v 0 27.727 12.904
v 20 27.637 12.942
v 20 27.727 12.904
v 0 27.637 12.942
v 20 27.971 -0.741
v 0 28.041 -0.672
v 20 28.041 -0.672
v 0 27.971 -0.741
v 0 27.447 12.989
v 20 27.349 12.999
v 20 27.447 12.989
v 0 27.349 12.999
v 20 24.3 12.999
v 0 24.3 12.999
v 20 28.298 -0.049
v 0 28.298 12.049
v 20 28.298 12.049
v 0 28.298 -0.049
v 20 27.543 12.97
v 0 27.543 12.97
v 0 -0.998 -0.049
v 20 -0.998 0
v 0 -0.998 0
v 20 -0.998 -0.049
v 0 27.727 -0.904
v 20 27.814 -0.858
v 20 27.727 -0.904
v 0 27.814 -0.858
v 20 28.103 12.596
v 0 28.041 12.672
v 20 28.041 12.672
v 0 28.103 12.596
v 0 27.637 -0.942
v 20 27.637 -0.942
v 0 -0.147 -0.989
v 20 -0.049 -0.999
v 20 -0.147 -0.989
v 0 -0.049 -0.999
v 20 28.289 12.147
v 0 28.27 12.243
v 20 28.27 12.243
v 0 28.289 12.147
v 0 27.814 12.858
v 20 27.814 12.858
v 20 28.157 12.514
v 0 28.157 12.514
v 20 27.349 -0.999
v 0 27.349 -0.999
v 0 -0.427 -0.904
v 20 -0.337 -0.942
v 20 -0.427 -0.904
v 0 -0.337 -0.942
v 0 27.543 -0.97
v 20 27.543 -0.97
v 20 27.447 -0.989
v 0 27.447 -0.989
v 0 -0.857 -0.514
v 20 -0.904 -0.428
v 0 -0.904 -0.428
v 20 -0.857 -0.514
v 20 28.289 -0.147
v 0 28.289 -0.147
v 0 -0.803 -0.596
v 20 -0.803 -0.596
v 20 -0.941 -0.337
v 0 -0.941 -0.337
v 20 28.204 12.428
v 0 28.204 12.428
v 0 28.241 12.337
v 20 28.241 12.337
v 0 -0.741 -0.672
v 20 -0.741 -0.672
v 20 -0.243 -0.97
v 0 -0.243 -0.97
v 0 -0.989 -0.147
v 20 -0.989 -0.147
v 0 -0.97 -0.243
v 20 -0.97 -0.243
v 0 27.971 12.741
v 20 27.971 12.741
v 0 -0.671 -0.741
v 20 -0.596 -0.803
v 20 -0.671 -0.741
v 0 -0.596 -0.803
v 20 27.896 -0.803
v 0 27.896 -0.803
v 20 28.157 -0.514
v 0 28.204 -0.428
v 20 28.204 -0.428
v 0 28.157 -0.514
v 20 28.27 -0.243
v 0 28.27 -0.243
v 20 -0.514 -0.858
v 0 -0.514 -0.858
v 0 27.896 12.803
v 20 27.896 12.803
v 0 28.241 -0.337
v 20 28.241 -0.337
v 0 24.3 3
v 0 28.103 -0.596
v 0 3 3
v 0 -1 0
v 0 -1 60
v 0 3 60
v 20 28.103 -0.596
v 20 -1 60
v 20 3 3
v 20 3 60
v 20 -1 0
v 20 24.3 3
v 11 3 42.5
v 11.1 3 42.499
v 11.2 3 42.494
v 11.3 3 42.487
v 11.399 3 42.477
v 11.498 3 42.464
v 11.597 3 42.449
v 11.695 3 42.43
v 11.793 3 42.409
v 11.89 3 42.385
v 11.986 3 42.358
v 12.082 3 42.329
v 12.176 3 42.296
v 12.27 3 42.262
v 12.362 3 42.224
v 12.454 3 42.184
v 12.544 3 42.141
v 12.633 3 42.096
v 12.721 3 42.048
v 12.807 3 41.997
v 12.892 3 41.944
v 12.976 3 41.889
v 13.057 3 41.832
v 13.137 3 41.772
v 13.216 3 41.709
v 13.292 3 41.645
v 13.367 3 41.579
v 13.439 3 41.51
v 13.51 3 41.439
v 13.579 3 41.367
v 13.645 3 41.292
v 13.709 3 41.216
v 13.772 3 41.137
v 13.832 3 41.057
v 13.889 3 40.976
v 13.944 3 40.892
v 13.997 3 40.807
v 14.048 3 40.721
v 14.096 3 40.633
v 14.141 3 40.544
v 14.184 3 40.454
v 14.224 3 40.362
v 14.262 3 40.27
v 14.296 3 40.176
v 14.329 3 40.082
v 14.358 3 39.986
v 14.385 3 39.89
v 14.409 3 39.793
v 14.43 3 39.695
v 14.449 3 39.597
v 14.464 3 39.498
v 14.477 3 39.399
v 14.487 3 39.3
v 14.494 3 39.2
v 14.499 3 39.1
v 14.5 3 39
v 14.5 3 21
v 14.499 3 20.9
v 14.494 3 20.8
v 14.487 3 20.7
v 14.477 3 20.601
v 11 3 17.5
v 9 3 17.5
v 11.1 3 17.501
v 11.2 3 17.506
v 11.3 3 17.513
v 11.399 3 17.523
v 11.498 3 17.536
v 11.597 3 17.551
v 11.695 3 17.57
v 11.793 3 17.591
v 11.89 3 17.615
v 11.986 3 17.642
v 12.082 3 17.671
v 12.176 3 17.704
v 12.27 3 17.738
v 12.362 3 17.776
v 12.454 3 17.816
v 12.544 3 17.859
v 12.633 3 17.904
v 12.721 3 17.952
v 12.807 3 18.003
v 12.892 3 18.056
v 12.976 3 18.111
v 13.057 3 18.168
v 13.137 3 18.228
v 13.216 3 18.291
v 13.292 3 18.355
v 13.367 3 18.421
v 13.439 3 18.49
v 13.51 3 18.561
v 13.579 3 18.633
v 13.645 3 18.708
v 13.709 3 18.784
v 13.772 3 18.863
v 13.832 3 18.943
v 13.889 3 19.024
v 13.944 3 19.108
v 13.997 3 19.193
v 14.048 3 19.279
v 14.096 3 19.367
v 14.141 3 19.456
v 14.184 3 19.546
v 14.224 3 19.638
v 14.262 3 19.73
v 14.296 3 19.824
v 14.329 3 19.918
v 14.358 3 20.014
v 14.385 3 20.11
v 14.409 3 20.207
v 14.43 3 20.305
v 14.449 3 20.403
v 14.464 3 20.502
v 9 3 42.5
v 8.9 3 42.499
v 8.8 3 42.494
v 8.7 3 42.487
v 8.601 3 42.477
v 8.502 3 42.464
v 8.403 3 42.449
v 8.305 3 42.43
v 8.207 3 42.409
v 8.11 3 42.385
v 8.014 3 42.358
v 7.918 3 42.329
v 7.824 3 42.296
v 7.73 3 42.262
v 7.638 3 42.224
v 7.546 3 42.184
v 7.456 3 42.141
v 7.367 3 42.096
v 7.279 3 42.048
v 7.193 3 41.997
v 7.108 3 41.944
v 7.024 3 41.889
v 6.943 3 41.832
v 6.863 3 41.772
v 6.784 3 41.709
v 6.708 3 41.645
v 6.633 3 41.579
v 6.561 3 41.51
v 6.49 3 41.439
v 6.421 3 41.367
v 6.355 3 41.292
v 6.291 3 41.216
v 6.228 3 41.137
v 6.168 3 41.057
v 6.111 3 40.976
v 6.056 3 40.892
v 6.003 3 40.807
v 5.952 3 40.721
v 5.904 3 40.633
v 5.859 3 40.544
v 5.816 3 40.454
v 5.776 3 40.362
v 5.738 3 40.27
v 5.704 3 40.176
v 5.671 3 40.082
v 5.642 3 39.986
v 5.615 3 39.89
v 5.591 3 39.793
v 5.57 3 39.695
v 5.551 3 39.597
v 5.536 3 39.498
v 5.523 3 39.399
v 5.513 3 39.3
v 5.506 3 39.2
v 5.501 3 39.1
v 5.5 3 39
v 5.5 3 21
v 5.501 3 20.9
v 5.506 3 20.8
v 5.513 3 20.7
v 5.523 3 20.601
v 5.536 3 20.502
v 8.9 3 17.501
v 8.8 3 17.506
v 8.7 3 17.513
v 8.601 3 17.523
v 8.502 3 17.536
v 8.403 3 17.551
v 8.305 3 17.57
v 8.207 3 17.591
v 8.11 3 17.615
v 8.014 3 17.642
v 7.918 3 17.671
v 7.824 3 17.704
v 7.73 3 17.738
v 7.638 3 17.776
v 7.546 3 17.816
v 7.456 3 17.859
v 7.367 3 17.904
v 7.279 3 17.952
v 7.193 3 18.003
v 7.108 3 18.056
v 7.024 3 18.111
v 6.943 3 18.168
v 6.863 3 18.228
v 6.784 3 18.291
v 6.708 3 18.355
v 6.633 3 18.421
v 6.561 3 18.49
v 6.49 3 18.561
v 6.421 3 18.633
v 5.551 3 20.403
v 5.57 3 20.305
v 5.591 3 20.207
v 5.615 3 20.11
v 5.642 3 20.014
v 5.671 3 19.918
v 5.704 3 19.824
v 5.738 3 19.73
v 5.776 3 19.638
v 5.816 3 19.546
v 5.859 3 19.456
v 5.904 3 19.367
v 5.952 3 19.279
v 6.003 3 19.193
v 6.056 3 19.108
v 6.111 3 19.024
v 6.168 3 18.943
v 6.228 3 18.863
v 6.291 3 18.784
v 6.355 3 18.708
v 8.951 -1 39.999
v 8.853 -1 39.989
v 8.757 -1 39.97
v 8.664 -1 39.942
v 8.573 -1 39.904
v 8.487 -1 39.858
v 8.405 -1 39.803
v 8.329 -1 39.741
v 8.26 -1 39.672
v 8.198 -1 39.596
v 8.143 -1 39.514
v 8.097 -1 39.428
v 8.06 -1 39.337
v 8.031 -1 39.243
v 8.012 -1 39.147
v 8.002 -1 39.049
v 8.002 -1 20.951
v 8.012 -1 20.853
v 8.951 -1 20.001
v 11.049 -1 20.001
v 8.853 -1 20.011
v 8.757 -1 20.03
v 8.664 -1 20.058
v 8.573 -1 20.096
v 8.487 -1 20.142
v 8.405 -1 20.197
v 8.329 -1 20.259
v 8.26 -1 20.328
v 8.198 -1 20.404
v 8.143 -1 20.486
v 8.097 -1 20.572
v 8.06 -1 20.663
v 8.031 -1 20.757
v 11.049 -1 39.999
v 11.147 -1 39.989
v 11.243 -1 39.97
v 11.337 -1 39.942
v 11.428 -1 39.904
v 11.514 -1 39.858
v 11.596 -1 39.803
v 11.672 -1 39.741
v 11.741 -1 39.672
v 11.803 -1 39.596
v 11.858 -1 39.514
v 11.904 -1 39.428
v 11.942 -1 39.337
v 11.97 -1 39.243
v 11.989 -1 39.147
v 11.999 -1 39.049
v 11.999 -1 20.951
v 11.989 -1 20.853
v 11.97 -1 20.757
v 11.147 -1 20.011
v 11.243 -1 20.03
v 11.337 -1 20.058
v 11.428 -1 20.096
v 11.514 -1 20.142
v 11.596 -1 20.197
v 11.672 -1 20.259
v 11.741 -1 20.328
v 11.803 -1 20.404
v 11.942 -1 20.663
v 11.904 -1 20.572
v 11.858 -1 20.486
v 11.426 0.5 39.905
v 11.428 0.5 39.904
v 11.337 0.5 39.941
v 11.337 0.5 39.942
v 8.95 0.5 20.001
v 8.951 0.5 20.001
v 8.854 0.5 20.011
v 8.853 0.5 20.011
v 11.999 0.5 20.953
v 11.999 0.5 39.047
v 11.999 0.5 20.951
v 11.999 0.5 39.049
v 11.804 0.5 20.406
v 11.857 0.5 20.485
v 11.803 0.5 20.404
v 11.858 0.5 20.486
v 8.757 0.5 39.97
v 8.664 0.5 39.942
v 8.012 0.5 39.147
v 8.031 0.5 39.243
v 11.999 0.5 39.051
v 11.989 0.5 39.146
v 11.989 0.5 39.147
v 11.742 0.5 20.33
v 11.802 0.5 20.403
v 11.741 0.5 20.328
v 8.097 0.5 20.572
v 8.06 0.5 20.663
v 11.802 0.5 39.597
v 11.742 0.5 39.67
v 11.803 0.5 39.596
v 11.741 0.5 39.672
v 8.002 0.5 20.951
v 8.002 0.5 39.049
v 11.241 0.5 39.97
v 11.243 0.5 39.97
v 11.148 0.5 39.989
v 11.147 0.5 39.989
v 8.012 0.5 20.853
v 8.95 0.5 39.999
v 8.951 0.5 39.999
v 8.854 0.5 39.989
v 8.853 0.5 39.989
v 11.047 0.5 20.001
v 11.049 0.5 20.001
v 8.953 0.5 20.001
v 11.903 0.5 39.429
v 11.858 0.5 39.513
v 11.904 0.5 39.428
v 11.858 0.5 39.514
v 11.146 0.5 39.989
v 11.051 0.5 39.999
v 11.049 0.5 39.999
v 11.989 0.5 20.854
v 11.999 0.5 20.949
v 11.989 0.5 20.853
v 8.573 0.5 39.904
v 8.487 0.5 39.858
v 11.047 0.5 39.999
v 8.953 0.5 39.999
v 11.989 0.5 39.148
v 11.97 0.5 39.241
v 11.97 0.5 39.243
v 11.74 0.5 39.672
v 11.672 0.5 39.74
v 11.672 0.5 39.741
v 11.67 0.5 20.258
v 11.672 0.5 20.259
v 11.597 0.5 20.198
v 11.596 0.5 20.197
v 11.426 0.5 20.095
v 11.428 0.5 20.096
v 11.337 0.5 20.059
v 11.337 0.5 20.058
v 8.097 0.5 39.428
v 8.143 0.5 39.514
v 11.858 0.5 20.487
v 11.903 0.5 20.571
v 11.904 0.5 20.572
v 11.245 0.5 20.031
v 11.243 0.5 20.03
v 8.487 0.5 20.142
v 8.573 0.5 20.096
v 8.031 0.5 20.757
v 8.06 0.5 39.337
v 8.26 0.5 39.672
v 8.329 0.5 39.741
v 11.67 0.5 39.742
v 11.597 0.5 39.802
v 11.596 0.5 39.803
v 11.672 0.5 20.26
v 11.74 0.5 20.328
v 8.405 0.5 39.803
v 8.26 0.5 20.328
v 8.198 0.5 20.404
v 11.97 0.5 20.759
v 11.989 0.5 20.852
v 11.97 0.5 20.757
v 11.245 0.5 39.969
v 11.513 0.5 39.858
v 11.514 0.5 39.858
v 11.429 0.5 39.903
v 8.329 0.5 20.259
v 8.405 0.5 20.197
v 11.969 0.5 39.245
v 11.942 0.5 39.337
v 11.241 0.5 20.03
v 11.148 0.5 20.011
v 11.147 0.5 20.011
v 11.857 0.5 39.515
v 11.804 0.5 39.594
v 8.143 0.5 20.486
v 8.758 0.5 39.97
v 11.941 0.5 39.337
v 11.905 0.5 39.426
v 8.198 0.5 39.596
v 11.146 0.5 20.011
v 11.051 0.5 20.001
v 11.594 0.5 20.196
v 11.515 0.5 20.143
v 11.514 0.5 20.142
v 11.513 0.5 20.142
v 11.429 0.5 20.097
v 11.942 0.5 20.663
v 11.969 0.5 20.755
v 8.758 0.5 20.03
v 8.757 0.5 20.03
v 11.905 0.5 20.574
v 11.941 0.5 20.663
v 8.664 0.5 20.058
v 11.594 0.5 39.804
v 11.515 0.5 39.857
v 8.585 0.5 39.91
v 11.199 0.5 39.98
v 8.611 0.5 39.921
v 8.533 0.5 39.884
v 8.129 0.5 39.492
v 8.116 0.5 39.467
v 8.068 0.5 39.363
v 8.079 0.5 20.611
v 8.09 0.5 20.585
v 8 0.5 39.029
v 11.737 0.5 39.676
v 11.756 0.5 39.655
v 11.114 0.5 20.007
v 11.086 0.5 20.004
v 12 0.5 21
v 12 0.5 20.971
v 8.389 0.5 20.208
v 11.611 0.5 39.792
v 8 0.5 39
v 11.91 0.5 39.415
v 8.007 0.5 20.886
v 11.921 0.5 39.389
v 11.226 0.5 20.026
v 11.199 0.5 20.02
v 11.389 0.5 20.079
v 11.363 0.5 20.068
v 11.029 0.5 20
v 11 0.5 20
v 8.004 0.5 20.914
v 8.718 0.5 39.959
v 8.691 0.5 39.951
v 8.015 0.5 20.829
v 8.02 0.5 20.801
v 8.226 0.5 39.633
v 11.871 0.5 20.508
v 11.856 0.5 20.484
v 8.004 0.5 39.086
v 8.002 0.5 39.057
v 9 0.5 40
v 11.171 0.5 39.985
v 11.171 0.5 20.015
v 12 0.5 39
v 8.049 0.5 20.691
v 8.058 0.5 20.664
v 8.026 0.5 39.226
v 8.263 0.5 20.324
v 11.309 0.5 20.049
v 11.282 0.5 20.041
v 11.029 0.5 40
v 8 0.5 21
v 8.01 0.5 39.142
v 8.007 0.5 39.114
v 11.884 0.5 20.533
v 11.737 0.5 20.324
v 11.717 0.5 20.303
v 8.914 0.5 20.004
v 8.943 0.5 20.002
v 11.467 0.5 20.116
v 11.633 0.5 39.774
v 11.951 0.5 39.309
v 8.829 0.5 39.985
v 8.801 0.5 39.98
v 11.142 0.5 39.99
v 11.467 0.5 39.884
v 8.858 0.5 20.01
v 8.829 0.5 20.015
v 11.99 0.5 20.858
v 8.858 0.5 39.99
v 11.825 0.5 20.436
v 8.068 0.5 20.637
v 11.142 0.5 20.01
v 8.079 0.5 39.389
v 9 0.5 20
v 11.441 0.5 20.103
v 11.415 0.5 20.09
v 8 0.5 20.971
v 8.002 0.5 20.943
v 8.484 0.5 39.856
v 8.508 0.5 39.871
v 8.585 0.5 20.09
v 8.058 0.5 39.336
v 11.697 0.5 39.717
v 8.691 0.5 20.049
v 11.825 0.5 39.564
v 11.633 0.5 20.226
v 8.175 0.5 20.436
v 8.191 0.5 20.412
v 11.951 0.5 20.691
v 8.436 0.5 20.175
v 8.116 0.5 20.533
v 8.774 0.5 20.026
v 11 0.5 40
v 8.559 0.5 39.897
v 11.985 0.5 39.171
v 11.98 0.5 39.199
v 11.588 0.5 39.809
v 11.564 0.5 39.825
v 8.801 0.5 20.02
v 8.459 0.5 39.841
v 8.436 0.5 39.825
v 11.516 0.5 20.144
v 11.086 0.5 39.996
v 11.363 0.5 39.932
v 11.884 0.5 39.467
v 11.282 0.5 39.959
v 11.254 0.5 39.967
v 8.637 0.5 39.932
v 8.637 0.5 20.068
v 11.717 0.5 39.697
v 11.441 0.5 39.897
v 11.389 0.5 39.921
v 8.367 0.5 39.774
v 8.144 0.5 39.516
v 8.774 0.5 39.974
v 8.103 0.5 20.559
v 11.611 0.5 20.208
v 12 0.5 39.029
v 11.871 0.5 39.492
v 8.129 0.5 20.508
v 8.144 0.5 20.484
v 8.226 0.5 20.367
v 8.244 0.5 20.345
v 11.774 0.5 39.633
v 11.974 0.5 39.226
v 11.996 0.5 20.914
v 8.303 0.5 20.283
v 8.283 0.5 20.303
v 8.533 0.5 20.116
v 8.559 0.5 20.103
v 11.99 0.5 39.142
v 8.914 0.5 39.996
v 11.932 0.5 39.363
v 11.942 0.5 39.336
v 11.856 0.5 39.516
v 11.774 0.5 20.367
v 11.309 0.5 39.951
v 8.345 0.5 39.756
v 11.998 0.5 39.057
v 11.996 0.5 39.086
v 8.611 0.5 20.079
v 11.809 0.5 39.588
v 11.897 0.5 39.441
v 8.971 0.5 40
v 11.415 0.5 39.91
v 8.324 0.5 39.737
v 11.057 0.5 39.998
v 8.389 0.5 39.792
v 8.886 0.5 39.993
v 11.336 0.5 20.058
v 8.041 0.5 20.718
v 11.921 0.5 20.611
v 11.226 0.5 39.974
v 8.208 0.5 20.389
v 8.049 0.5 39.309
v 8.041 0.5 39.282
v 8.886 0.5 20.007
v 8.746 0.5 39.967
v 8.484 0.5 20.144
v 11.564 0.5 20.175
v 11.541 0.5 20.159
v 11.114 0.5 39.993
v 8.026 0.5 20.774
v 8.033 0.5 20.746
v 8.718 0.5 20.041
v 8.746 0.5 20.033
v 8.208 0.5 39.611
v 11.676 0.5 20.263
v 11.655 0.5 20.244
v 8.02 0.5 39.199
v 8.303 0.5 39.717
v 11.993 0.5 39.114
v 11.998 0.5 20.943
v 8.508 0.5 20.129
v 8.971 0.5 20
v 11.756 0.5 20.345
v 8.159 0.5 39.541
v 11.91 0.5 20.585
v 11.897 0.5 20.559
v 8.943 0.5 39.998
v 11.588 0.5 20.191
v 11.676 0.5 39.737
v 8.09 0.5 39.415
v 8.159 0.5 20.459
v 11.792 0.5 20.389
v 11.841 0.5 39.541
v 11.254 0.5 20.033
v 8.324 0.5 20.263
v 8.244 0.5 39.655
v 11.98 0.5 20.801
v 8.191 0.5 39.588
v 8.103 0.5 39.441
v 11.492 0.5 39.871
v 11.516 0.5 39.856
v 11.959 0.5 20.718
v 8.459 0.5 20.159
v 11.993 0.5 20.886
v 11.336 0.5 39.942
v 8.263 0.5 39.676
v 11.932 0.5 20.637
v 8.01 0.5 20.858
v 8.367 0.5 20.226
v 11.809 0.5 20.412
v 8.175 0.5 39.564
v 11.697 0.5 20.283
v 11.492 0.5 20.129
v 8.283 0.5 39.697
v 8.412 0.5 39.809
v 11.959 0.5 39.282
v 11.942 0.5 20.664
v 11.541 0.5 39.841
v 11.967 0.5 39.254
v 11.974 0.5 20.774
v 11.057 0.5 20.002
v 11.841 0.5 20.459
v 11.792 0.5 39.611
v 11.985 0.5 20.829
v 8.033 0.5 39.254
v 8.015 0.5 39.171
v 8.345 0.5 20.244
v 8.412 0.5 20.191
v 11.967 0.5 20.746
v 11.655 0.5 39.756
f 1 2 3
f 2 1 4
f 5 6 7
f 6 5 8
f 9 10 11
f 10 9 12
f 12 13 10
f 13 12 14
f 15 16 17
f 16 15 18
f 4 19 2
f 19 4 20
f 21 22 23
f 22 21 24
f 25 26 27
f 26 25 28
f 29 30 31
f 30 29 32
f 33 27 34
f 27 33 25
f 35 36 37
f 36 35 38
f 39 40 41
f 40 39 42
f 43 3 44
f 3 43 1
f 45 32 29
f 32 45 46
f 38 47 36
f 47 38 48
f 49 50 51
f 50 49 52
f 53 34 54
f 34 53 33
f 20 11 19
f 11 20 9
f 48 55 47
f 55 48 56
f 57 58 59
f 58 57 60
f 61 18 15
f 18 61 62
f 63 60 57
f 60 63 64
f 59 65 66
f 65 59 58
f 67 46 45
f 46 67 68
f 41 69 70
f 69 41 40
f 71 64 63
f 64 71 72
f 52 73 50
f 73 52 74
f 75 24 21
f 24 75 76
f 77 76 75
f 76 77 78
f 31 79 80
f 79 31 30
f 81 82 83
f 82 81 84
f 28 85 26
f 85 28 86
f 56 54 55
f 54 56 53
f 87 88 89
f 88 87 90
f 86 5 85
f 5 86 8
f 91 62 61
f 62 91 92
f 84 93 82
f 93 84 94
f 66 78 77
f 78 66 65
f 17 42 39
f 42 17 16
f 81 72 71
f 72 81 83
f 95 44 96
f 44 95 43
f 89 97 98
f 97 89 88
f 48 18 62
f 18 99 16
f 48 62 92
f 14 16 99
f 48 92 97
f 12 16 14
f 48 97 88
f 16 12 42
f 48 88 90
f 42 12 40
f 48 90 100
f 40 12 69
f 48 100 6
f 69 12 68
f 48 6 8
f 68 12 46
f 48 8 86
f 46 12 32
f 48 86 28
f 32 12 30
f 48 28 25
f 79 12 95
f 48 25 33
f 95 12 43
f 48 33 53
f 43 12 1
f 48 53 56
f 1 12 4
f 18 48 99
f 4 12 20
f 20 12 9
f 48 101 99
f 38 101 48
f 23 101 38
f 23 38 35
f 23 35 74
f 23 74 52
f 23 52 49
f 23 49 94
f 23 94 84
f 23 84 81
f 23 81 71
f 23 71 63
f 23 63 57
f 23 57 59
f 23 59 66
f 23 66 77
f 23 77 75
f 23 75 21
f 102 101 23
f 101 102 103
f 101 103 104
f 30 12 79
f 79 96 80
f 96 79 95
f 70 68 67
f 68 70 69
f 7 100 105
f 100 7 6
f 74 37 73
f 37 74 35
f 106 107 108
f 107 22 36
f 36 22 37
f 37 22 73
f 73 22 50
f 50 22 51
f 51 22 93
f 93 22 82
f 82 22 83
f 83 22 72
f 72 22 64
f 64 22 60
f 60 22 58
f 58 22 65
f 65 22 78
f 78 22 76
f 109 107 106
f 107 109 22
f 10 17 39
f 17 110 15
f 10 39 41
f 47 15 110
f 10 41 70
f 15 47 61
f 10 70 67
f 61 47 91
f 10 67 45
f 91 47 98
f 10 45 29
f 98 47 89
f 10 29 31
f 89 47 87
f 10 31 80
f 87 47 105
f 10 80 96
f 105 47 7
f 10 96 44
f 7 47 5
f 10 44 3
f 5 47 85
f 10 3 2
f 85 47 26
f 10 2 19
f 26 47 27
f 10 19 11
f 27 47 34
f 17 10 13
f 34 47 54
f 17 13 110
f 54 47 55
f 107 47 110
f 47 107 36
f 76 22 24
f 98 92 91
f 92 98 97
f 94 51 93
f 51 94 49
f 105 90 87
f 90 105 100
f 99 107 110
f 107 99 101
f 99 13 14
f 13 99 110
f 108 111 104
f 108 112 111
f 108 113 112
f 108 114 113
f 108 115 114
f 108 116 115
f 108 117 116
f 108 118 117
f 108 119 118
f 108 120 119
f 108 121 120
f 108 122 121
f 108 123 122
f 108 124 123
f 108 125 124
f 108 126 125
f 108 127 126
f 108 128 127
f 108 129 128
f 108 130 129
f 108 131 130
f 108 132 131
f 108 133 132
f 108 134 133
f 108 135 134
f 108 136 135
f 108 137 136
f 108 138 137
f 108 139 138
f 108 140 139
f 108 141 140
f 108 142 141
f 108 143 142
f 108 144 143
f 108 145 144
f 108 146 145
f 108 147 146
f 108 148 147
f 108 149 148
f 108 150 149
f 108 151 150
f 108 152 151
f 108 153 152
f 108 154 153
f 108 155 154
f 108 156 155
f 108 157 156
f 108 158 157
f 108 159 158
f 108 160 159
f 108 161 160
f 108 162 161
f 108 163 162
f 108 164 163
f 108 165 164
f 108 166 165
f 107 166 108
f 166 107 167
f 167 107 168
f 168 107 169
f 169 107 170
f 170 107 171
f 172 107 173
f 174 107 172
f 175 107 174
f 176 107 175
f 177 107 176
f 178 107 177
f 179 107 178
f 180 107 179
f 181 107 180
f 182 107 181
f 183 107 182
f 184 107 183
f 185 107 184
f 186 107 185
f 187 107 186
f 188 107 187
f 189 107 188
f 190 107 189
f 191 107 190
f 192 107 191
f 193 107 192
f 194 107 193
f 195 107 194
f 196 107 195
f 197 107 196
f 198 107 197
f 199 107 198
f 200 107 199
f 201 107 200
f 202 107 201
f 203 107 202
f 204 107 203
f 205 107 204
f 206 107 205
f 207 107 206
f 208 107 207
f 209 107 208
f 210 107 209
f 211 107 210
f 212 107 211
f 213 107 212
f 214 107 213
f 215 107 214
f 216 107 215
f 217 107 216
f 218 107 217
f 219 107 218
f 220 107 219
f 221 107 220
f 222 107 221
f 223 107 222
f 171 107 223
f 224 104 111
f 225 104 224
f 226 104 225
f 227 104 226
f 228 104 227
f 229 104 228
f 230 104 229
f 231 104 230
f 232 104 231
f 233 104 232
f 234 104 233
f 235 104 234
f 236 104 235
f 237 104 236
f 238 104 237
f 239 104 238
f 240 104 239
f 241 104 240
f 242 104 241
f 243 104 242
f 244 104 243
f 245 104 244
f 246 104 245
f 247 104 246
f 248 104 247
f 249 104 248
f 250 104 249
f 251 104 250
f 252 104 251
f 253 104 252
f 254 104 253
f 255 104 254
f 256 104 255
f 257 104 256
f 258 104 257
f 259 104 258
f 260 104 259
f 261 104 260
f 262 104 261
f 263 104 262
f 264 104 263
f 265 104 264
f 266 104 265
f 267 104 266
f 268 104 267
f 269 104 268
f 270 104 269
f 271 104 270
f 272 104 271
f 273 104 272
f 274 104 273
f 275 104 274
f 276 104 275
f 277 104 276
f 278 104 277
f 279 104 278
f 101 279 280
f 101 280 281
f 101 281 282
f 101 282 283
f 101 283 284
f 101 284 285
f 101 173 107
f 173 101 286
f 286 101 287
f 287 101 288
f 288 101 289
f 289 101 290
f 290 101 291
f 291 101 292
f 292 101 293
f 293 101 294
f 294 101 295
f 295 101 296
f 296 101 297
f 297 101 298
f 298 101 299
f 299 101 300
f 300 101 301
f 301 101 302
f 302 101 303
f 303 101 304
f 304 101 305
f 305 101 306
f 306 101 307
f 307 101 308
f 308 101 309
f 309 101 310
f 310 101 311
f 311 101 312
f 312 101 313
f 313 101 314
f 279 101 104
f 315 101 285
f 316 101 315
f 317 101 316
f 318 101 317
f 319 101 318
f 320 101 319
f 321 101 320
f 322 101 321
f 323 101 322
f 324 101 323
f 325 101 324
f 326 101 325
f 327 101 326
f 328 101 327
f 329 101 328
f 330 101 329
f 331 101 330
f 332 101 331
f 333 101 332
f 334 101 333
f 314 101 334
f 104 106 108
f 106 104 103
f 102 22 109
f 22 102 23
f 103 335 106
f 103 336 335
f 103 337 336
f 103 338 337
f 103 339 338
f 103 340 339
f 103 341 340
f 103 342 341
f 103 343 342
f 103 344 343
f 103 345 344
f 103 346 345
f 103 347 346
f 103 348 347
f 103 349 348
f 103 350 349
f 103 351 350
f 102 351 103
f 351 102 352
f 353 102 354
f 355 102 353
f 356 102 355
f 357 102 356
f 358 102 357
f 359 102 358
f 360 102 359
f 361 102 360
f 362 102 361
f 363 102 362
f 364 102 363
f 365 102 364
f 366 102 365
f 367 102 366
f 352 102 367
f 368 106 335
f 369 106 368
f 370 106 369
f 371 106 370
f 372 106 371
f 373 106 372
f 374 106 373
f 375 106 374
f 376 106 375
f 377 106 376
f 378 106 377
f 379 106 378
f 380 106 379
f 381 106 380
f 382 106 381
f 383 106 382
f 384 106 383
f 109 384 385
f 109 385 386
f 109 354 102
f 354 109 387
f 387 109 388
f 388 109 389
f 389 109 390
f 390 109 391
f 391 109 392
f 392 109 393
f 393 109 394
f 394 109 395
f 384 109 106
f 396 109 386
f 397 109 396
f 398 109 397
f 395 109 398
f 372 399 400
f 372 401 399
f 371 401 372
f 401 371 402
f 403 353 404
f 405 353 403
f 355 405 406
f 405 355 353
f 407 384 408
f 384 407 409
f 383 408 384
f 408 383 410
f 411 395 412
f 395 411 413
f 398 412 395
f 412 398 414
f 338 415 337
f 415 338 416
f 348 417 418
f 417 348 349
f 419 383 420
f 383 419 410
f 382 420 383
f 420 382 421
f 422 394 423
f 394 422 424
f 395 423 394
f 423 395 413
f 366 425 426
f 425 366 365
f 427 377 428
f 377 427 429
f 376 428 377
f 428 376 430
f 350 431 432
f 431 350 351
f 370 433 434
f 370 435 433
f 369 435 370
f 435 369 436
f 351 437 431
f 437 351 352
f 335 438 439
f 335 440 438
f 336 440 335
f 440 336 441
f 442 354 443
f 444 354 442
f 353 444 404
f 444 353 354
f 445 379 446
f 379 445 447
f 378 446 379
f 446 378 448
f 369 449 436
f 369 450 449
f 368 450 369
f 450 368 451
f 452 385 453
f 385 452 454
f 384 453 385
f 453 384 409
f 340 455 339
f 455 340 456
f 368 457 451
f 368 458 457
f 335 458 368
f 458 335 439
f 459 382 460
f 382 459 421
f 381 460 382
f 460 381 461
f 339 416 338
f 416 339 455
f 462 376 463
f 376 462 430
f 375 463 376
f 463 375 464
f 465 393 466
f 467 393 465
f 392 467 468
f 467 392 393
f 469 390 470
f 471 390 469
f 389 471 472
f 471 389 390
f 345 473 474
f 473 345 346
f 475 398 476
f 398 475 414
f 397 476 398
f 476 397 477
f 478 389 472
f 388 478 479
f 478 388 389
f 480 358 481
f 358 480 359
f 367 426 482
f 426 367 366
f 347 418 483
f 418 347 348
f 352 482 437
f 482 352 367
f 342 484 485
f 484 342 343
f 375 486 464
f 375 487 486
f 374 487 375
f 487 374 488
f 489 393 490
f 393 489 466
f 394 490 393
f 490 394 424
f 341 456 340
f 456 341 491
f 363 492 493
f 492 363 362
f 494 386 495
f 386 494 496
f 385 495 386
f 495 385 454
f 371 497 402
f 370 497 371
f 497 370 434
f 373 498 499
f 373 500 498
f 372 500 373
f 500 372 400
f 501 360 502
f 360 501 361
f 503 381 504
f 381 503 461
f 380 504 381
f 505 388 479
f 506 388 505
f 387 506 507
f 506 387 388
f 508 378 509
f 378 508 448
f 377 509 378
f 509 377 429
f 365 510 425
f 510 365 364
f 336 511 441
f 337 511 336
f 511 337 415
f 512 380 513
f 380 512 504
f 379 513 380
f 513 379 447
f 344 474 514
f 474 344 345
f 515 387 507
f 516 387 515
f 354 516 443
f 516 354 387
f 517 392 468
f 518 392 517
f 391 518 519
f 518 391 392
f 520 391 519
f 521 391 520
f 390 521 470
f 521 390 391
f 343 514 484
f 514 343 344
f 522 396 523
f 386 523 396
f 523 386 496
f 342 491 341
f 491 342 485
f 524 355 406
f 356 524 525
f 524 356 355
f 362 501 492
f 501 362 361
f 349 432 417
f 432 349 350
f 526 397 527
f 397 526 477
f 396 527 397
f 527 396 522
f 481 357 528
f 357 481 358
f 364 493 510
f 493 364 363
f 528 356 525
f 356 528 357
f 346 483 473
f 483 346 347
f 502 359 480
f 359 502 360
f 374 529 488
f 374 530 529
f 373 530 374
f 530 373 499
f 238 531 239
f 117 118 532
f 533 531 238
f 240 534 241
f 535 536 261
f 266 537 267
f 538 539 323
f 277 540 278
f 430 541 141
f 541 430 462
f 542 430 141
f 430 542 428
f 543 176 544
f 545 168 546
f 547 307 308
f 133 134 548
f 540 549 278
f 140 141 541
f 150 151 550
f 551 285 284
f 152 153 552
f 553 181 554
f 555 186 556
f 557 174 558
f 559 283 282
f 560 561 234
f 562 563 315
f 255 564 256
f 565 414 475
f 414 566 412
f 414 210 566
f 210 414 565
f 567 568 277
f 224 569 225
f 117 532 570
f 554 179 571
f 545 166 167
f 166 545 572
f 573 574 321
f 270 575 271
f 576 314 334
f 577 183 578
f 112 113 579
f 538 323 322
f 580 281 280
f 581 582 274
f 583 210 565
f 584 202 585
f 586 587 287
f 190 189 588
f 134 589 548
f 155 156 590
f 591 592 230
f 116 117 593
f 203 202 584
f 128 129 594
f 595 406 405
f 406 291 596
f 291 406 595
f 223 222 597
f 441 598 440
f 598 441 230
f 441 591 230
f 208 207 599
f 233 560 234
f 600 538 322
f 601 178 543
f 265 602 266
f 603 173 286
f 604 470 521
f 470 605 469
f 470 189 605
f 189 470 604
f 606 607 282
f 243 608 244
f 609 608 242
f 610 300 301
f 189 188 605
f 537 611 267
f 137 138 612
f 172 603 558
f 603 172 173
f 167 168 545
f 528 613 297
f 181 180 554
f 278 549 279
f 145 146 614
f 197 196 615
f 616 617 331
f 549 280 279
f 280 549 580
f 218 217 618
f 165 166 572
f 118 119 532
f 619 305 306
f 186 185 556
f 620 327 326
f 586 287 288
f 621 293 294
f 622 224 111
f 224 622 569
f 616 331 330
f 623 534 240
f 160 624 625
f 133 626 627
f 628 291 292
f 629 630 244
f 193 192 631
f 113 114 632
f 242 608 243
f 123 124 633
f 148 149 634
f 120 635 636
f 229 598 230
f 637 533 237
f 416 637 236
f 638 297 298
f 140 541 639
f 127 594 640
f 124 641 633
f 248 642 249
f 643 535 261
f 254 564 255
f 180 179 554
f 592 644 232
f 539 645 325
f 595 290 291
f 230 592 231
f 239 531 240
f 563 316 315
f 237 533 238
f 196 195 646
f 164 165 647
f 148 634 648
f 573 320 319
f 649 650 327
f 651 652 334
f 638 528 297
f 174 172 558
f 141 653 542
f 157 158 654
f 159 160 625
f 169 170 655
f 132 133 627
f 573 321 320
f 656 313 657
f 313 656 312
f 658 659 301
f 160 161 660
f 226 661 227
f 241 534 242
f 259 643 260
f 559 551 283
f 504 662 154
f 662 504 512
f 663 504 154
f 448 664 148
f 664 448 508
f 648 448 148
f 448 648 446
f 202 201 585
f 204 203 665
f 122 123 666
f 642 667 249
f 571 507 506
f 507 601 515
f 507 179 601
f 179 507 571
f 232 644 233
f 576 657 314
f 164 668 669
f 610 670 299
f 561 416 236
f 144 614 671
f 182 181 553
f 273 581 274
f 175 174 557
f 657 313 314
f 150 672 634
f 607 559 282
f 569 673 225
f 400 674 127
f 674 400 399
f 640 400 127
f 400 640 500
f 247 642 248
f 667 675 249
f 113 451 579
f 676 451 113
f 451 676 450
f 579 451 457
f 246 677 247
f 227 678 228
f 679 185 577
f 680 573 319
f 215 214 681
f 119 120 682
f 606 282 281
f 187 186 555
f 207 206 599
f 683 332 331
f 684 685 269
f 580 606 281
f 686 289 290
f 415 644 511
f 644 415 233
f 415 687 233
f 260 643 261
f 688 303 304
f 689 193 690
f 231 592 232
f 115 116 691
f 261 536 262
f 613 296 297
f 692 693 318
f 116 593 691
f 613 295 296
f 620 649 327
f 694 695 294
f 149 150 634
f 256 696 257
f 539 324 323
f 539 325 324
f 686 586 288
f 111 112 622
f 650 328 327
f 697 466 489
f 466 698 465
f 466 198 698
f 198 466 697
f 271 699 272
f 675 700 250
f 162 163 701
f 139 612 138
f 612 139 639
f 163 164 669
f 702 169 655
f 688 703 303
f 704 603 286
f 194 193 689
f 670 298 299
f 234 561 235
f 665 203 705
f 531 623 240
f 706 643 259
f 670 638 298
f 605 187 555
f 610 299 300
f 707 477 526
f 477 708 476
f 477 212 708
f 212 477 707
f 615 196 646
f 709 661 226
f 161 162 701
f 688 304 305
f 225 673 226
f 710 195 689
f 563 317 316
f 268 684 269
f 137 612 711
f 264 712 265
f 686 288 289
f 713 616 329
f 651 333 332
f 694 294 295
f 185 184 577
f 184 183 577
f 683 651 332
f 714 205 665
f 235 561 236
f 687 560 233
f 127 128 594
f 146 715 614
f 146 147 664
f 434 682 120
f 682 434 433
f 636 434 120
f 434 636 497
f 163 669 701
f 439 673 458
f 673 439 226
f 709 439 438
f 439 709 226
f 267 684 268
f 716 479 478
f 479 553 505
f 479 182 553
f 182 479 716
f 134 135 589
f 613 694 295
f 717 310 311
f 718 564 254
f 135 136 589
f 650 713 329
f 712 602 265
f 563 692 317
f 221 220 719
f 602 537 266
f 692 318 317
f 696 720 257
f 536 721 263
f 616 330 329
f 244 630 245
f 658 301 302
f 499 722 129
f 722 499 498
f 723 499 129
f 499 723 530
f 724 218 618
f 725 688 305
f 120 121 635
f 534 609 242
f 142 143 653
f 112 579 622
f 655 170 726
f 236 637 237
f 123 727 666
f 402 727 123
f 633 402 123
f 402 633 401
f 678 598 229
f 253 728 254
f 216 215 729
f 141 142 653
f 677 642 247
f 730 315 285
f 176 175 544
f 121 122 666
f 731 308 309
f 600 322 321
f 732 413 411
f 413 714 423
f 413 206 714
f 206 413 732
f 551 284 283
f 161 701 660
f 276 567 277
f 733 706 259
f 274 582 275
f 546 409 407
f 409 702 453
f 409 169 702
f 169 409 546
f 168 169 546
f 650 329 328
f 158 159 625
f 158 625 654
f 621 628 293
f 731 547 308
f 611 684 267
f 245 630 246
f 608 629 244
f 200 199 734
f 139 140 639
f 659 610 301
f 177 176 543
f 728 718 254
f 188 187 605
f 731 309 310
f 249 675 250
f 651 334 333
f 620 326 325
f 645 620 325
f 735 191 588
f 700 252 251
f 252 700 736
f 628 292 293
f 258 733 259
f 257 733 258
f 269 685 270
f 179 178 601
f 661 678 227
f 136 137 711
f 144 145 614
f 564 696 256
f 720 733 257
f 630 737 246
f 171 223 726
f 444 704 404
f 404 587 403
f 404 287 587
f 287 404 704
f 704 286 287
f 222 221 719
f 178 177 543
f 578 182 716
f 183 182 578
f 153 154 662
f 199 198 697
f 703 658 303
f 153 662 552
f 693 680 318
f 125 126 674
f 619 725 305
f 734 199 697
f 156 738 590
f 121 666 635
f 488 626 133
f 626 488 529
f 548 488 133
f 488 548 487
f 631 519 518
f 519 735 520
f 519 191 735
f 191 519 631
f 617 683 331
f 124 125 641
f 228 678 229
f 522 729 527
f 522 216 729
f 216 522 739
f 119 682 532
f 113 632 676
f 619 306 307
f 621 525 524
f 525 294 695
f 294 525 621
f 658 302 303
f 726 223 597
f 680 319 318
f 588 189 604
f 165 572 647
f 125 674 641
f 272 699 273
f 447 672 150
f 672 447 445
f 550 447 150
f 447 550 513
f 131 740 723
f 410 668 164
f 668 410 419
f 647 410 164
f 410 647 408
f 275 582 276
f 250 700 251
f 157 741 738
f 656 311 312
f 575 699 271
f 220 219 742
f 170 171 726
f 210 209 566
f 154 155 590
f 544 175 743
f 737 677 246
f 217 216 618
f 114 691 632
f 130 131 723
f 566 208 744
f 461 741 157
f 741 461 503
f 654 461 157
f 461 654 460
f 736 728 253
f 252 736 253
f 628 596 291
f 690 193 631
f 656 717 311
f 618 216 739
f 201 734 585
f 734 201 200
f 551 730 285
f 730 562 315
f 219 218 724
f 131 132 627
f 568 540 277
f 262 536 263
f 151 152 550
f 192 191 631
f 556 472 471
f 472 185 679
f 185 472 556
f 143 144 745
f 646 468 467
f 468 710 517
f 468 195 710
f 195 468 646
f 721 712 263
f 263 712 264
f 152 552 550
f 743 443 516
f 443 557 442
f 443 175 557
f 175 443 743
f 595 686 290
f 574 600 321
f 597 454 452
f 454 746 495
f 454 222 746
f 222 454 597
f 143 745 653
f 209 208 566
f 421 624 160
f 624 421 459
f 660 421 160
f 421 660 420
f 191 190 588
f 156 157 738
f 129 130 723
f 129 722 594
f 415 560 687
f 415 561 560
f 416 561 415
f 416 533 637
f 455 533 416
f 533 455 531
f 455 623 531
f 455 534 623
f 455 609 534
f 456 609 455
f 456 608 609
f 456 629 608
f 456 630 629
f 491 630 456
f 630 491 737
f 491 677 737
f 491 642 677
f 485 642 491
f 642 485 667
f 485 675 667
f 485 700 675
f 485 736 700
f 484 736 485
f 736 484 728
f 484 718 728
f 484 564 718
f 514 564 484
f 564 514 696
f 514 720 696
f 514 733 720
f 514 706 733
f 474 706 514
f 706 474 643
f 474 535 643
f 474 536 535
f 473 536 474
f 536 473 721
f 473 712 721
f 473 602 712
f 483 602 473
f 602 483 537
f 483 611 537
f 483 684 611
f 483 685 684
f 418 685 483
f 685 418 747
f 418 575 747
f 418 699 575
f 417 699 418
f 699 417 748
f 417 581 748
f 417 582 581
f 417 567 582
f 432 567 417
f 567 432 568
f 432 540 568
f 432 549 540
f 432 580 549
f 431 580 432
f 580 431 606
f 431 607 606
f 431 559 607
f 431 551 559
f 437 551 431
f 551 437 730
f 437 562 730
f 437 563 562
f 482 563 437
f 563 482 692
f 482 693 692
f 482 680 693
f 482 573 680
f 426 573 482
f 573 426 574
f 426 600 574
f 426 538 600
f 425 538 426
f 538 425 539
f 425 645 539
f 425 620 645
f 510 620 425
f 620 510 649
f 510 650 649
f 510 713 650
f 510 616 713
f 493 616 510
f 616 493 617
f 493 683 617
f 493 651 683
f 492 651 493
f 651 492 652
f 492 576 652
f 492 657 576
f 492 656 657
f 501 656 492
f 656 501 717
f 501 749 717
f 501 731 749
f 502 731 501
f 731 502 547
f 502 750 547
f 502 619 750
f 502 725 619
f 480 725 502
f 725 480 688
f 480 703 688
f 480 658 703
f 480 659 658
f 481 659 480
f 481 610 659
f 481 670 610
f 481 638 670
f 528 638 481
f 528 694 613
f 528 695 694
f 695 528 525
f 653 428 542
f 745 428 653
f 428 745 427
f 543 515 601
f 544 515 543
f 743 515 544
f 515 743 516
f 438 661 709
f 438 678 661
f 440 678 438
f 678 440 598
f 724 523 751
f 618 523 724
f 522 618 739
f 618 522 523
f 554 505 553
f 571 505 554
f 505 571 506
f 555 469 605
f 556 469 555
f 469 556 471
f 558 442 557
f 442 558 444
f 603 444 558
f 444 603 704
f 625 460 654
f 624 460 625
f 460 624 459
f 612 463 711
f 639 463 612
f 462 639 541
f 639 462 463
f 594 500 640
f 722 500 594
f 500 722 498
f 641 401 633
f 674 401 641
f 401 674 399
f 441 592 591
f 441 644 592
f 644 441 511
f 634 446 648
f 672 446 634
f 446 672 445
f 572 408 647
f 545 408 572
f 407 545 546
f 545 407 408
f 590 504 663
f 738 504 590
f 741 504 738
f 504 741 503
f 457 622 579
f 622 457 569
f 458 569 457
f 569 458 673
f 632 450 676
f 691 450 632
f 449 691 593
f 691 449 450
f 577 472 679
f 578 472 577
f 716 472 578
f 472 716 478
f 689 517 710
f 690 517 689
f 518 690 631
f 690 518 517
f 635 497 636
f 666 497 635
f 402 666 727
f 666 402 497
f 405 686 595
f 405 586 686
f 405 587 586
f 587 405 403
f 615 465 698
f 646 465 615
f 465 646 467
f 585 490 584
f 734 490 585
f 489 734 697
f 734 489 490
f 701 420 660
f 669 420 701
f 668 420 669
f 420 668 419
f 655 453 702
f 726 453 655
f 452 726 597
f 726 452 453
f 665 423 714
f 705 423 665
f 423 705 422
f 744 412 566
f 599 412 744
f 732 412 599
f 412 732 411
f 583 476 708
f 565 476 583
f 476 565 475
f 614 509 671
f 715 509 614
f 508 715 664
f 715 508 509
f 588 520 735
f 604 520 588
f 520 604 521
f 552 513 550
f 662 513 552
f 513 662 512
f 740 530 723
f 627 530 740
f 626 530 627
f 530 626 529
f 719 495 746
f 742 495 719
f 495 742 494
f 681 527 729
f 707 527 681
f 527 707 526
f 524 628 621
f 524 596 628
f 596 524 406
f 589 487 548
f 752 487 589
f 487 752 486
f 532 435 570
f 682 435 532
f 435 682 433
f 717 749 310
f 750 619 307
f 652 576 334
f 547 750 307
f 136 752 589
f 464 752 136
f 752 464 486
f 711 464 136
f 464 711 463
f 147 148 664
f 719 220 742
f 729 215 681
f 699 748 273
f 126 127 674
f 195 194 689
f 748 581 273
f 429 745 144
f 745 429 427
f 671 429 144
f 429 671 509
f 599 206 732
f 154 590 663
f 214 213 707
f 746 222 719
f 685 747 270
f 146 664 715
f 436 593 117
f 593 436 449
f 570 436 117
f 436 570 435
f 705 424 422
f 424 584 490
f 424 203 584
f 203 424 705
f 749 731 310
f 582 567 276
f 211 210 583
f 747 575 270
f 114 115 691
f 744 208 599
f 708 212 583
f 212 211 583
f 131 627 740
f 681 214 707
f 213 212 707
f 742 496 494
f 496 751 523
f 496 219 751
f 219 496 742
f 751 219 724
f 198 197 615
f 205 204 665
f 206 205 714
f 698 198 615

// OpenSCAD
spacing = 0.1;
board_thickness = 21.1 + spacing * 2;
thickness = 4;
roundness = 1;
width = 20;
height = 60;
hook_height = 10;
hole_length = 20;
hole_width = 4;
sinking = 2.5;

$fs = 0.1;
$fa = 1;

difference() {
	union() {
		difference() {
			minkowski() { //Bottom cup.
				cube([width, board_thickness + thickness * 2 - roundness * 2, hook_height + thickness - roundness * 2]);
				scale([0, 1, 1]) {
					sphere(r=roundness);
				}
			}
			translate([0, thickness - roundness, thickness - roundness]) {
				cube([width, board_thickness, hook_height]); //Hole for board.
			}
		}
		translate([0, -roundness, 0]) {
			cube([width, thickness, height]); //Wall side.
		}
	}
	minkowski() { //Hole for screw.
		translate([(width - hole_width) / 2 + roundness, -roundness, (height - hole_length) / 2 + roundness]) {
			minkowski() {
				cube([hole_width - roundness * 2, thickness, hole_length - roundness * 2]);
				scale([1, 0, 1]) {
					sphere(r=roundness);
				}
			}
		}
	}
	minkowski() { //Sinking of screw.
		translate([(width - hole_width) / 2 + roundness, thickness - roundness, (height - hole_length) / 2 + roundness]) {
			minkowski() {
				scale([1, 0, 1]) {
					cube([hole_width - roundness * 2, thickness, hole_length - roundness * 2]);
				}
				rotate([90, 0, 0]) {
					cylinder(r1=roundness + sinking, r2=roundness, h=sinking);
				}
			}
		}
	}
}
